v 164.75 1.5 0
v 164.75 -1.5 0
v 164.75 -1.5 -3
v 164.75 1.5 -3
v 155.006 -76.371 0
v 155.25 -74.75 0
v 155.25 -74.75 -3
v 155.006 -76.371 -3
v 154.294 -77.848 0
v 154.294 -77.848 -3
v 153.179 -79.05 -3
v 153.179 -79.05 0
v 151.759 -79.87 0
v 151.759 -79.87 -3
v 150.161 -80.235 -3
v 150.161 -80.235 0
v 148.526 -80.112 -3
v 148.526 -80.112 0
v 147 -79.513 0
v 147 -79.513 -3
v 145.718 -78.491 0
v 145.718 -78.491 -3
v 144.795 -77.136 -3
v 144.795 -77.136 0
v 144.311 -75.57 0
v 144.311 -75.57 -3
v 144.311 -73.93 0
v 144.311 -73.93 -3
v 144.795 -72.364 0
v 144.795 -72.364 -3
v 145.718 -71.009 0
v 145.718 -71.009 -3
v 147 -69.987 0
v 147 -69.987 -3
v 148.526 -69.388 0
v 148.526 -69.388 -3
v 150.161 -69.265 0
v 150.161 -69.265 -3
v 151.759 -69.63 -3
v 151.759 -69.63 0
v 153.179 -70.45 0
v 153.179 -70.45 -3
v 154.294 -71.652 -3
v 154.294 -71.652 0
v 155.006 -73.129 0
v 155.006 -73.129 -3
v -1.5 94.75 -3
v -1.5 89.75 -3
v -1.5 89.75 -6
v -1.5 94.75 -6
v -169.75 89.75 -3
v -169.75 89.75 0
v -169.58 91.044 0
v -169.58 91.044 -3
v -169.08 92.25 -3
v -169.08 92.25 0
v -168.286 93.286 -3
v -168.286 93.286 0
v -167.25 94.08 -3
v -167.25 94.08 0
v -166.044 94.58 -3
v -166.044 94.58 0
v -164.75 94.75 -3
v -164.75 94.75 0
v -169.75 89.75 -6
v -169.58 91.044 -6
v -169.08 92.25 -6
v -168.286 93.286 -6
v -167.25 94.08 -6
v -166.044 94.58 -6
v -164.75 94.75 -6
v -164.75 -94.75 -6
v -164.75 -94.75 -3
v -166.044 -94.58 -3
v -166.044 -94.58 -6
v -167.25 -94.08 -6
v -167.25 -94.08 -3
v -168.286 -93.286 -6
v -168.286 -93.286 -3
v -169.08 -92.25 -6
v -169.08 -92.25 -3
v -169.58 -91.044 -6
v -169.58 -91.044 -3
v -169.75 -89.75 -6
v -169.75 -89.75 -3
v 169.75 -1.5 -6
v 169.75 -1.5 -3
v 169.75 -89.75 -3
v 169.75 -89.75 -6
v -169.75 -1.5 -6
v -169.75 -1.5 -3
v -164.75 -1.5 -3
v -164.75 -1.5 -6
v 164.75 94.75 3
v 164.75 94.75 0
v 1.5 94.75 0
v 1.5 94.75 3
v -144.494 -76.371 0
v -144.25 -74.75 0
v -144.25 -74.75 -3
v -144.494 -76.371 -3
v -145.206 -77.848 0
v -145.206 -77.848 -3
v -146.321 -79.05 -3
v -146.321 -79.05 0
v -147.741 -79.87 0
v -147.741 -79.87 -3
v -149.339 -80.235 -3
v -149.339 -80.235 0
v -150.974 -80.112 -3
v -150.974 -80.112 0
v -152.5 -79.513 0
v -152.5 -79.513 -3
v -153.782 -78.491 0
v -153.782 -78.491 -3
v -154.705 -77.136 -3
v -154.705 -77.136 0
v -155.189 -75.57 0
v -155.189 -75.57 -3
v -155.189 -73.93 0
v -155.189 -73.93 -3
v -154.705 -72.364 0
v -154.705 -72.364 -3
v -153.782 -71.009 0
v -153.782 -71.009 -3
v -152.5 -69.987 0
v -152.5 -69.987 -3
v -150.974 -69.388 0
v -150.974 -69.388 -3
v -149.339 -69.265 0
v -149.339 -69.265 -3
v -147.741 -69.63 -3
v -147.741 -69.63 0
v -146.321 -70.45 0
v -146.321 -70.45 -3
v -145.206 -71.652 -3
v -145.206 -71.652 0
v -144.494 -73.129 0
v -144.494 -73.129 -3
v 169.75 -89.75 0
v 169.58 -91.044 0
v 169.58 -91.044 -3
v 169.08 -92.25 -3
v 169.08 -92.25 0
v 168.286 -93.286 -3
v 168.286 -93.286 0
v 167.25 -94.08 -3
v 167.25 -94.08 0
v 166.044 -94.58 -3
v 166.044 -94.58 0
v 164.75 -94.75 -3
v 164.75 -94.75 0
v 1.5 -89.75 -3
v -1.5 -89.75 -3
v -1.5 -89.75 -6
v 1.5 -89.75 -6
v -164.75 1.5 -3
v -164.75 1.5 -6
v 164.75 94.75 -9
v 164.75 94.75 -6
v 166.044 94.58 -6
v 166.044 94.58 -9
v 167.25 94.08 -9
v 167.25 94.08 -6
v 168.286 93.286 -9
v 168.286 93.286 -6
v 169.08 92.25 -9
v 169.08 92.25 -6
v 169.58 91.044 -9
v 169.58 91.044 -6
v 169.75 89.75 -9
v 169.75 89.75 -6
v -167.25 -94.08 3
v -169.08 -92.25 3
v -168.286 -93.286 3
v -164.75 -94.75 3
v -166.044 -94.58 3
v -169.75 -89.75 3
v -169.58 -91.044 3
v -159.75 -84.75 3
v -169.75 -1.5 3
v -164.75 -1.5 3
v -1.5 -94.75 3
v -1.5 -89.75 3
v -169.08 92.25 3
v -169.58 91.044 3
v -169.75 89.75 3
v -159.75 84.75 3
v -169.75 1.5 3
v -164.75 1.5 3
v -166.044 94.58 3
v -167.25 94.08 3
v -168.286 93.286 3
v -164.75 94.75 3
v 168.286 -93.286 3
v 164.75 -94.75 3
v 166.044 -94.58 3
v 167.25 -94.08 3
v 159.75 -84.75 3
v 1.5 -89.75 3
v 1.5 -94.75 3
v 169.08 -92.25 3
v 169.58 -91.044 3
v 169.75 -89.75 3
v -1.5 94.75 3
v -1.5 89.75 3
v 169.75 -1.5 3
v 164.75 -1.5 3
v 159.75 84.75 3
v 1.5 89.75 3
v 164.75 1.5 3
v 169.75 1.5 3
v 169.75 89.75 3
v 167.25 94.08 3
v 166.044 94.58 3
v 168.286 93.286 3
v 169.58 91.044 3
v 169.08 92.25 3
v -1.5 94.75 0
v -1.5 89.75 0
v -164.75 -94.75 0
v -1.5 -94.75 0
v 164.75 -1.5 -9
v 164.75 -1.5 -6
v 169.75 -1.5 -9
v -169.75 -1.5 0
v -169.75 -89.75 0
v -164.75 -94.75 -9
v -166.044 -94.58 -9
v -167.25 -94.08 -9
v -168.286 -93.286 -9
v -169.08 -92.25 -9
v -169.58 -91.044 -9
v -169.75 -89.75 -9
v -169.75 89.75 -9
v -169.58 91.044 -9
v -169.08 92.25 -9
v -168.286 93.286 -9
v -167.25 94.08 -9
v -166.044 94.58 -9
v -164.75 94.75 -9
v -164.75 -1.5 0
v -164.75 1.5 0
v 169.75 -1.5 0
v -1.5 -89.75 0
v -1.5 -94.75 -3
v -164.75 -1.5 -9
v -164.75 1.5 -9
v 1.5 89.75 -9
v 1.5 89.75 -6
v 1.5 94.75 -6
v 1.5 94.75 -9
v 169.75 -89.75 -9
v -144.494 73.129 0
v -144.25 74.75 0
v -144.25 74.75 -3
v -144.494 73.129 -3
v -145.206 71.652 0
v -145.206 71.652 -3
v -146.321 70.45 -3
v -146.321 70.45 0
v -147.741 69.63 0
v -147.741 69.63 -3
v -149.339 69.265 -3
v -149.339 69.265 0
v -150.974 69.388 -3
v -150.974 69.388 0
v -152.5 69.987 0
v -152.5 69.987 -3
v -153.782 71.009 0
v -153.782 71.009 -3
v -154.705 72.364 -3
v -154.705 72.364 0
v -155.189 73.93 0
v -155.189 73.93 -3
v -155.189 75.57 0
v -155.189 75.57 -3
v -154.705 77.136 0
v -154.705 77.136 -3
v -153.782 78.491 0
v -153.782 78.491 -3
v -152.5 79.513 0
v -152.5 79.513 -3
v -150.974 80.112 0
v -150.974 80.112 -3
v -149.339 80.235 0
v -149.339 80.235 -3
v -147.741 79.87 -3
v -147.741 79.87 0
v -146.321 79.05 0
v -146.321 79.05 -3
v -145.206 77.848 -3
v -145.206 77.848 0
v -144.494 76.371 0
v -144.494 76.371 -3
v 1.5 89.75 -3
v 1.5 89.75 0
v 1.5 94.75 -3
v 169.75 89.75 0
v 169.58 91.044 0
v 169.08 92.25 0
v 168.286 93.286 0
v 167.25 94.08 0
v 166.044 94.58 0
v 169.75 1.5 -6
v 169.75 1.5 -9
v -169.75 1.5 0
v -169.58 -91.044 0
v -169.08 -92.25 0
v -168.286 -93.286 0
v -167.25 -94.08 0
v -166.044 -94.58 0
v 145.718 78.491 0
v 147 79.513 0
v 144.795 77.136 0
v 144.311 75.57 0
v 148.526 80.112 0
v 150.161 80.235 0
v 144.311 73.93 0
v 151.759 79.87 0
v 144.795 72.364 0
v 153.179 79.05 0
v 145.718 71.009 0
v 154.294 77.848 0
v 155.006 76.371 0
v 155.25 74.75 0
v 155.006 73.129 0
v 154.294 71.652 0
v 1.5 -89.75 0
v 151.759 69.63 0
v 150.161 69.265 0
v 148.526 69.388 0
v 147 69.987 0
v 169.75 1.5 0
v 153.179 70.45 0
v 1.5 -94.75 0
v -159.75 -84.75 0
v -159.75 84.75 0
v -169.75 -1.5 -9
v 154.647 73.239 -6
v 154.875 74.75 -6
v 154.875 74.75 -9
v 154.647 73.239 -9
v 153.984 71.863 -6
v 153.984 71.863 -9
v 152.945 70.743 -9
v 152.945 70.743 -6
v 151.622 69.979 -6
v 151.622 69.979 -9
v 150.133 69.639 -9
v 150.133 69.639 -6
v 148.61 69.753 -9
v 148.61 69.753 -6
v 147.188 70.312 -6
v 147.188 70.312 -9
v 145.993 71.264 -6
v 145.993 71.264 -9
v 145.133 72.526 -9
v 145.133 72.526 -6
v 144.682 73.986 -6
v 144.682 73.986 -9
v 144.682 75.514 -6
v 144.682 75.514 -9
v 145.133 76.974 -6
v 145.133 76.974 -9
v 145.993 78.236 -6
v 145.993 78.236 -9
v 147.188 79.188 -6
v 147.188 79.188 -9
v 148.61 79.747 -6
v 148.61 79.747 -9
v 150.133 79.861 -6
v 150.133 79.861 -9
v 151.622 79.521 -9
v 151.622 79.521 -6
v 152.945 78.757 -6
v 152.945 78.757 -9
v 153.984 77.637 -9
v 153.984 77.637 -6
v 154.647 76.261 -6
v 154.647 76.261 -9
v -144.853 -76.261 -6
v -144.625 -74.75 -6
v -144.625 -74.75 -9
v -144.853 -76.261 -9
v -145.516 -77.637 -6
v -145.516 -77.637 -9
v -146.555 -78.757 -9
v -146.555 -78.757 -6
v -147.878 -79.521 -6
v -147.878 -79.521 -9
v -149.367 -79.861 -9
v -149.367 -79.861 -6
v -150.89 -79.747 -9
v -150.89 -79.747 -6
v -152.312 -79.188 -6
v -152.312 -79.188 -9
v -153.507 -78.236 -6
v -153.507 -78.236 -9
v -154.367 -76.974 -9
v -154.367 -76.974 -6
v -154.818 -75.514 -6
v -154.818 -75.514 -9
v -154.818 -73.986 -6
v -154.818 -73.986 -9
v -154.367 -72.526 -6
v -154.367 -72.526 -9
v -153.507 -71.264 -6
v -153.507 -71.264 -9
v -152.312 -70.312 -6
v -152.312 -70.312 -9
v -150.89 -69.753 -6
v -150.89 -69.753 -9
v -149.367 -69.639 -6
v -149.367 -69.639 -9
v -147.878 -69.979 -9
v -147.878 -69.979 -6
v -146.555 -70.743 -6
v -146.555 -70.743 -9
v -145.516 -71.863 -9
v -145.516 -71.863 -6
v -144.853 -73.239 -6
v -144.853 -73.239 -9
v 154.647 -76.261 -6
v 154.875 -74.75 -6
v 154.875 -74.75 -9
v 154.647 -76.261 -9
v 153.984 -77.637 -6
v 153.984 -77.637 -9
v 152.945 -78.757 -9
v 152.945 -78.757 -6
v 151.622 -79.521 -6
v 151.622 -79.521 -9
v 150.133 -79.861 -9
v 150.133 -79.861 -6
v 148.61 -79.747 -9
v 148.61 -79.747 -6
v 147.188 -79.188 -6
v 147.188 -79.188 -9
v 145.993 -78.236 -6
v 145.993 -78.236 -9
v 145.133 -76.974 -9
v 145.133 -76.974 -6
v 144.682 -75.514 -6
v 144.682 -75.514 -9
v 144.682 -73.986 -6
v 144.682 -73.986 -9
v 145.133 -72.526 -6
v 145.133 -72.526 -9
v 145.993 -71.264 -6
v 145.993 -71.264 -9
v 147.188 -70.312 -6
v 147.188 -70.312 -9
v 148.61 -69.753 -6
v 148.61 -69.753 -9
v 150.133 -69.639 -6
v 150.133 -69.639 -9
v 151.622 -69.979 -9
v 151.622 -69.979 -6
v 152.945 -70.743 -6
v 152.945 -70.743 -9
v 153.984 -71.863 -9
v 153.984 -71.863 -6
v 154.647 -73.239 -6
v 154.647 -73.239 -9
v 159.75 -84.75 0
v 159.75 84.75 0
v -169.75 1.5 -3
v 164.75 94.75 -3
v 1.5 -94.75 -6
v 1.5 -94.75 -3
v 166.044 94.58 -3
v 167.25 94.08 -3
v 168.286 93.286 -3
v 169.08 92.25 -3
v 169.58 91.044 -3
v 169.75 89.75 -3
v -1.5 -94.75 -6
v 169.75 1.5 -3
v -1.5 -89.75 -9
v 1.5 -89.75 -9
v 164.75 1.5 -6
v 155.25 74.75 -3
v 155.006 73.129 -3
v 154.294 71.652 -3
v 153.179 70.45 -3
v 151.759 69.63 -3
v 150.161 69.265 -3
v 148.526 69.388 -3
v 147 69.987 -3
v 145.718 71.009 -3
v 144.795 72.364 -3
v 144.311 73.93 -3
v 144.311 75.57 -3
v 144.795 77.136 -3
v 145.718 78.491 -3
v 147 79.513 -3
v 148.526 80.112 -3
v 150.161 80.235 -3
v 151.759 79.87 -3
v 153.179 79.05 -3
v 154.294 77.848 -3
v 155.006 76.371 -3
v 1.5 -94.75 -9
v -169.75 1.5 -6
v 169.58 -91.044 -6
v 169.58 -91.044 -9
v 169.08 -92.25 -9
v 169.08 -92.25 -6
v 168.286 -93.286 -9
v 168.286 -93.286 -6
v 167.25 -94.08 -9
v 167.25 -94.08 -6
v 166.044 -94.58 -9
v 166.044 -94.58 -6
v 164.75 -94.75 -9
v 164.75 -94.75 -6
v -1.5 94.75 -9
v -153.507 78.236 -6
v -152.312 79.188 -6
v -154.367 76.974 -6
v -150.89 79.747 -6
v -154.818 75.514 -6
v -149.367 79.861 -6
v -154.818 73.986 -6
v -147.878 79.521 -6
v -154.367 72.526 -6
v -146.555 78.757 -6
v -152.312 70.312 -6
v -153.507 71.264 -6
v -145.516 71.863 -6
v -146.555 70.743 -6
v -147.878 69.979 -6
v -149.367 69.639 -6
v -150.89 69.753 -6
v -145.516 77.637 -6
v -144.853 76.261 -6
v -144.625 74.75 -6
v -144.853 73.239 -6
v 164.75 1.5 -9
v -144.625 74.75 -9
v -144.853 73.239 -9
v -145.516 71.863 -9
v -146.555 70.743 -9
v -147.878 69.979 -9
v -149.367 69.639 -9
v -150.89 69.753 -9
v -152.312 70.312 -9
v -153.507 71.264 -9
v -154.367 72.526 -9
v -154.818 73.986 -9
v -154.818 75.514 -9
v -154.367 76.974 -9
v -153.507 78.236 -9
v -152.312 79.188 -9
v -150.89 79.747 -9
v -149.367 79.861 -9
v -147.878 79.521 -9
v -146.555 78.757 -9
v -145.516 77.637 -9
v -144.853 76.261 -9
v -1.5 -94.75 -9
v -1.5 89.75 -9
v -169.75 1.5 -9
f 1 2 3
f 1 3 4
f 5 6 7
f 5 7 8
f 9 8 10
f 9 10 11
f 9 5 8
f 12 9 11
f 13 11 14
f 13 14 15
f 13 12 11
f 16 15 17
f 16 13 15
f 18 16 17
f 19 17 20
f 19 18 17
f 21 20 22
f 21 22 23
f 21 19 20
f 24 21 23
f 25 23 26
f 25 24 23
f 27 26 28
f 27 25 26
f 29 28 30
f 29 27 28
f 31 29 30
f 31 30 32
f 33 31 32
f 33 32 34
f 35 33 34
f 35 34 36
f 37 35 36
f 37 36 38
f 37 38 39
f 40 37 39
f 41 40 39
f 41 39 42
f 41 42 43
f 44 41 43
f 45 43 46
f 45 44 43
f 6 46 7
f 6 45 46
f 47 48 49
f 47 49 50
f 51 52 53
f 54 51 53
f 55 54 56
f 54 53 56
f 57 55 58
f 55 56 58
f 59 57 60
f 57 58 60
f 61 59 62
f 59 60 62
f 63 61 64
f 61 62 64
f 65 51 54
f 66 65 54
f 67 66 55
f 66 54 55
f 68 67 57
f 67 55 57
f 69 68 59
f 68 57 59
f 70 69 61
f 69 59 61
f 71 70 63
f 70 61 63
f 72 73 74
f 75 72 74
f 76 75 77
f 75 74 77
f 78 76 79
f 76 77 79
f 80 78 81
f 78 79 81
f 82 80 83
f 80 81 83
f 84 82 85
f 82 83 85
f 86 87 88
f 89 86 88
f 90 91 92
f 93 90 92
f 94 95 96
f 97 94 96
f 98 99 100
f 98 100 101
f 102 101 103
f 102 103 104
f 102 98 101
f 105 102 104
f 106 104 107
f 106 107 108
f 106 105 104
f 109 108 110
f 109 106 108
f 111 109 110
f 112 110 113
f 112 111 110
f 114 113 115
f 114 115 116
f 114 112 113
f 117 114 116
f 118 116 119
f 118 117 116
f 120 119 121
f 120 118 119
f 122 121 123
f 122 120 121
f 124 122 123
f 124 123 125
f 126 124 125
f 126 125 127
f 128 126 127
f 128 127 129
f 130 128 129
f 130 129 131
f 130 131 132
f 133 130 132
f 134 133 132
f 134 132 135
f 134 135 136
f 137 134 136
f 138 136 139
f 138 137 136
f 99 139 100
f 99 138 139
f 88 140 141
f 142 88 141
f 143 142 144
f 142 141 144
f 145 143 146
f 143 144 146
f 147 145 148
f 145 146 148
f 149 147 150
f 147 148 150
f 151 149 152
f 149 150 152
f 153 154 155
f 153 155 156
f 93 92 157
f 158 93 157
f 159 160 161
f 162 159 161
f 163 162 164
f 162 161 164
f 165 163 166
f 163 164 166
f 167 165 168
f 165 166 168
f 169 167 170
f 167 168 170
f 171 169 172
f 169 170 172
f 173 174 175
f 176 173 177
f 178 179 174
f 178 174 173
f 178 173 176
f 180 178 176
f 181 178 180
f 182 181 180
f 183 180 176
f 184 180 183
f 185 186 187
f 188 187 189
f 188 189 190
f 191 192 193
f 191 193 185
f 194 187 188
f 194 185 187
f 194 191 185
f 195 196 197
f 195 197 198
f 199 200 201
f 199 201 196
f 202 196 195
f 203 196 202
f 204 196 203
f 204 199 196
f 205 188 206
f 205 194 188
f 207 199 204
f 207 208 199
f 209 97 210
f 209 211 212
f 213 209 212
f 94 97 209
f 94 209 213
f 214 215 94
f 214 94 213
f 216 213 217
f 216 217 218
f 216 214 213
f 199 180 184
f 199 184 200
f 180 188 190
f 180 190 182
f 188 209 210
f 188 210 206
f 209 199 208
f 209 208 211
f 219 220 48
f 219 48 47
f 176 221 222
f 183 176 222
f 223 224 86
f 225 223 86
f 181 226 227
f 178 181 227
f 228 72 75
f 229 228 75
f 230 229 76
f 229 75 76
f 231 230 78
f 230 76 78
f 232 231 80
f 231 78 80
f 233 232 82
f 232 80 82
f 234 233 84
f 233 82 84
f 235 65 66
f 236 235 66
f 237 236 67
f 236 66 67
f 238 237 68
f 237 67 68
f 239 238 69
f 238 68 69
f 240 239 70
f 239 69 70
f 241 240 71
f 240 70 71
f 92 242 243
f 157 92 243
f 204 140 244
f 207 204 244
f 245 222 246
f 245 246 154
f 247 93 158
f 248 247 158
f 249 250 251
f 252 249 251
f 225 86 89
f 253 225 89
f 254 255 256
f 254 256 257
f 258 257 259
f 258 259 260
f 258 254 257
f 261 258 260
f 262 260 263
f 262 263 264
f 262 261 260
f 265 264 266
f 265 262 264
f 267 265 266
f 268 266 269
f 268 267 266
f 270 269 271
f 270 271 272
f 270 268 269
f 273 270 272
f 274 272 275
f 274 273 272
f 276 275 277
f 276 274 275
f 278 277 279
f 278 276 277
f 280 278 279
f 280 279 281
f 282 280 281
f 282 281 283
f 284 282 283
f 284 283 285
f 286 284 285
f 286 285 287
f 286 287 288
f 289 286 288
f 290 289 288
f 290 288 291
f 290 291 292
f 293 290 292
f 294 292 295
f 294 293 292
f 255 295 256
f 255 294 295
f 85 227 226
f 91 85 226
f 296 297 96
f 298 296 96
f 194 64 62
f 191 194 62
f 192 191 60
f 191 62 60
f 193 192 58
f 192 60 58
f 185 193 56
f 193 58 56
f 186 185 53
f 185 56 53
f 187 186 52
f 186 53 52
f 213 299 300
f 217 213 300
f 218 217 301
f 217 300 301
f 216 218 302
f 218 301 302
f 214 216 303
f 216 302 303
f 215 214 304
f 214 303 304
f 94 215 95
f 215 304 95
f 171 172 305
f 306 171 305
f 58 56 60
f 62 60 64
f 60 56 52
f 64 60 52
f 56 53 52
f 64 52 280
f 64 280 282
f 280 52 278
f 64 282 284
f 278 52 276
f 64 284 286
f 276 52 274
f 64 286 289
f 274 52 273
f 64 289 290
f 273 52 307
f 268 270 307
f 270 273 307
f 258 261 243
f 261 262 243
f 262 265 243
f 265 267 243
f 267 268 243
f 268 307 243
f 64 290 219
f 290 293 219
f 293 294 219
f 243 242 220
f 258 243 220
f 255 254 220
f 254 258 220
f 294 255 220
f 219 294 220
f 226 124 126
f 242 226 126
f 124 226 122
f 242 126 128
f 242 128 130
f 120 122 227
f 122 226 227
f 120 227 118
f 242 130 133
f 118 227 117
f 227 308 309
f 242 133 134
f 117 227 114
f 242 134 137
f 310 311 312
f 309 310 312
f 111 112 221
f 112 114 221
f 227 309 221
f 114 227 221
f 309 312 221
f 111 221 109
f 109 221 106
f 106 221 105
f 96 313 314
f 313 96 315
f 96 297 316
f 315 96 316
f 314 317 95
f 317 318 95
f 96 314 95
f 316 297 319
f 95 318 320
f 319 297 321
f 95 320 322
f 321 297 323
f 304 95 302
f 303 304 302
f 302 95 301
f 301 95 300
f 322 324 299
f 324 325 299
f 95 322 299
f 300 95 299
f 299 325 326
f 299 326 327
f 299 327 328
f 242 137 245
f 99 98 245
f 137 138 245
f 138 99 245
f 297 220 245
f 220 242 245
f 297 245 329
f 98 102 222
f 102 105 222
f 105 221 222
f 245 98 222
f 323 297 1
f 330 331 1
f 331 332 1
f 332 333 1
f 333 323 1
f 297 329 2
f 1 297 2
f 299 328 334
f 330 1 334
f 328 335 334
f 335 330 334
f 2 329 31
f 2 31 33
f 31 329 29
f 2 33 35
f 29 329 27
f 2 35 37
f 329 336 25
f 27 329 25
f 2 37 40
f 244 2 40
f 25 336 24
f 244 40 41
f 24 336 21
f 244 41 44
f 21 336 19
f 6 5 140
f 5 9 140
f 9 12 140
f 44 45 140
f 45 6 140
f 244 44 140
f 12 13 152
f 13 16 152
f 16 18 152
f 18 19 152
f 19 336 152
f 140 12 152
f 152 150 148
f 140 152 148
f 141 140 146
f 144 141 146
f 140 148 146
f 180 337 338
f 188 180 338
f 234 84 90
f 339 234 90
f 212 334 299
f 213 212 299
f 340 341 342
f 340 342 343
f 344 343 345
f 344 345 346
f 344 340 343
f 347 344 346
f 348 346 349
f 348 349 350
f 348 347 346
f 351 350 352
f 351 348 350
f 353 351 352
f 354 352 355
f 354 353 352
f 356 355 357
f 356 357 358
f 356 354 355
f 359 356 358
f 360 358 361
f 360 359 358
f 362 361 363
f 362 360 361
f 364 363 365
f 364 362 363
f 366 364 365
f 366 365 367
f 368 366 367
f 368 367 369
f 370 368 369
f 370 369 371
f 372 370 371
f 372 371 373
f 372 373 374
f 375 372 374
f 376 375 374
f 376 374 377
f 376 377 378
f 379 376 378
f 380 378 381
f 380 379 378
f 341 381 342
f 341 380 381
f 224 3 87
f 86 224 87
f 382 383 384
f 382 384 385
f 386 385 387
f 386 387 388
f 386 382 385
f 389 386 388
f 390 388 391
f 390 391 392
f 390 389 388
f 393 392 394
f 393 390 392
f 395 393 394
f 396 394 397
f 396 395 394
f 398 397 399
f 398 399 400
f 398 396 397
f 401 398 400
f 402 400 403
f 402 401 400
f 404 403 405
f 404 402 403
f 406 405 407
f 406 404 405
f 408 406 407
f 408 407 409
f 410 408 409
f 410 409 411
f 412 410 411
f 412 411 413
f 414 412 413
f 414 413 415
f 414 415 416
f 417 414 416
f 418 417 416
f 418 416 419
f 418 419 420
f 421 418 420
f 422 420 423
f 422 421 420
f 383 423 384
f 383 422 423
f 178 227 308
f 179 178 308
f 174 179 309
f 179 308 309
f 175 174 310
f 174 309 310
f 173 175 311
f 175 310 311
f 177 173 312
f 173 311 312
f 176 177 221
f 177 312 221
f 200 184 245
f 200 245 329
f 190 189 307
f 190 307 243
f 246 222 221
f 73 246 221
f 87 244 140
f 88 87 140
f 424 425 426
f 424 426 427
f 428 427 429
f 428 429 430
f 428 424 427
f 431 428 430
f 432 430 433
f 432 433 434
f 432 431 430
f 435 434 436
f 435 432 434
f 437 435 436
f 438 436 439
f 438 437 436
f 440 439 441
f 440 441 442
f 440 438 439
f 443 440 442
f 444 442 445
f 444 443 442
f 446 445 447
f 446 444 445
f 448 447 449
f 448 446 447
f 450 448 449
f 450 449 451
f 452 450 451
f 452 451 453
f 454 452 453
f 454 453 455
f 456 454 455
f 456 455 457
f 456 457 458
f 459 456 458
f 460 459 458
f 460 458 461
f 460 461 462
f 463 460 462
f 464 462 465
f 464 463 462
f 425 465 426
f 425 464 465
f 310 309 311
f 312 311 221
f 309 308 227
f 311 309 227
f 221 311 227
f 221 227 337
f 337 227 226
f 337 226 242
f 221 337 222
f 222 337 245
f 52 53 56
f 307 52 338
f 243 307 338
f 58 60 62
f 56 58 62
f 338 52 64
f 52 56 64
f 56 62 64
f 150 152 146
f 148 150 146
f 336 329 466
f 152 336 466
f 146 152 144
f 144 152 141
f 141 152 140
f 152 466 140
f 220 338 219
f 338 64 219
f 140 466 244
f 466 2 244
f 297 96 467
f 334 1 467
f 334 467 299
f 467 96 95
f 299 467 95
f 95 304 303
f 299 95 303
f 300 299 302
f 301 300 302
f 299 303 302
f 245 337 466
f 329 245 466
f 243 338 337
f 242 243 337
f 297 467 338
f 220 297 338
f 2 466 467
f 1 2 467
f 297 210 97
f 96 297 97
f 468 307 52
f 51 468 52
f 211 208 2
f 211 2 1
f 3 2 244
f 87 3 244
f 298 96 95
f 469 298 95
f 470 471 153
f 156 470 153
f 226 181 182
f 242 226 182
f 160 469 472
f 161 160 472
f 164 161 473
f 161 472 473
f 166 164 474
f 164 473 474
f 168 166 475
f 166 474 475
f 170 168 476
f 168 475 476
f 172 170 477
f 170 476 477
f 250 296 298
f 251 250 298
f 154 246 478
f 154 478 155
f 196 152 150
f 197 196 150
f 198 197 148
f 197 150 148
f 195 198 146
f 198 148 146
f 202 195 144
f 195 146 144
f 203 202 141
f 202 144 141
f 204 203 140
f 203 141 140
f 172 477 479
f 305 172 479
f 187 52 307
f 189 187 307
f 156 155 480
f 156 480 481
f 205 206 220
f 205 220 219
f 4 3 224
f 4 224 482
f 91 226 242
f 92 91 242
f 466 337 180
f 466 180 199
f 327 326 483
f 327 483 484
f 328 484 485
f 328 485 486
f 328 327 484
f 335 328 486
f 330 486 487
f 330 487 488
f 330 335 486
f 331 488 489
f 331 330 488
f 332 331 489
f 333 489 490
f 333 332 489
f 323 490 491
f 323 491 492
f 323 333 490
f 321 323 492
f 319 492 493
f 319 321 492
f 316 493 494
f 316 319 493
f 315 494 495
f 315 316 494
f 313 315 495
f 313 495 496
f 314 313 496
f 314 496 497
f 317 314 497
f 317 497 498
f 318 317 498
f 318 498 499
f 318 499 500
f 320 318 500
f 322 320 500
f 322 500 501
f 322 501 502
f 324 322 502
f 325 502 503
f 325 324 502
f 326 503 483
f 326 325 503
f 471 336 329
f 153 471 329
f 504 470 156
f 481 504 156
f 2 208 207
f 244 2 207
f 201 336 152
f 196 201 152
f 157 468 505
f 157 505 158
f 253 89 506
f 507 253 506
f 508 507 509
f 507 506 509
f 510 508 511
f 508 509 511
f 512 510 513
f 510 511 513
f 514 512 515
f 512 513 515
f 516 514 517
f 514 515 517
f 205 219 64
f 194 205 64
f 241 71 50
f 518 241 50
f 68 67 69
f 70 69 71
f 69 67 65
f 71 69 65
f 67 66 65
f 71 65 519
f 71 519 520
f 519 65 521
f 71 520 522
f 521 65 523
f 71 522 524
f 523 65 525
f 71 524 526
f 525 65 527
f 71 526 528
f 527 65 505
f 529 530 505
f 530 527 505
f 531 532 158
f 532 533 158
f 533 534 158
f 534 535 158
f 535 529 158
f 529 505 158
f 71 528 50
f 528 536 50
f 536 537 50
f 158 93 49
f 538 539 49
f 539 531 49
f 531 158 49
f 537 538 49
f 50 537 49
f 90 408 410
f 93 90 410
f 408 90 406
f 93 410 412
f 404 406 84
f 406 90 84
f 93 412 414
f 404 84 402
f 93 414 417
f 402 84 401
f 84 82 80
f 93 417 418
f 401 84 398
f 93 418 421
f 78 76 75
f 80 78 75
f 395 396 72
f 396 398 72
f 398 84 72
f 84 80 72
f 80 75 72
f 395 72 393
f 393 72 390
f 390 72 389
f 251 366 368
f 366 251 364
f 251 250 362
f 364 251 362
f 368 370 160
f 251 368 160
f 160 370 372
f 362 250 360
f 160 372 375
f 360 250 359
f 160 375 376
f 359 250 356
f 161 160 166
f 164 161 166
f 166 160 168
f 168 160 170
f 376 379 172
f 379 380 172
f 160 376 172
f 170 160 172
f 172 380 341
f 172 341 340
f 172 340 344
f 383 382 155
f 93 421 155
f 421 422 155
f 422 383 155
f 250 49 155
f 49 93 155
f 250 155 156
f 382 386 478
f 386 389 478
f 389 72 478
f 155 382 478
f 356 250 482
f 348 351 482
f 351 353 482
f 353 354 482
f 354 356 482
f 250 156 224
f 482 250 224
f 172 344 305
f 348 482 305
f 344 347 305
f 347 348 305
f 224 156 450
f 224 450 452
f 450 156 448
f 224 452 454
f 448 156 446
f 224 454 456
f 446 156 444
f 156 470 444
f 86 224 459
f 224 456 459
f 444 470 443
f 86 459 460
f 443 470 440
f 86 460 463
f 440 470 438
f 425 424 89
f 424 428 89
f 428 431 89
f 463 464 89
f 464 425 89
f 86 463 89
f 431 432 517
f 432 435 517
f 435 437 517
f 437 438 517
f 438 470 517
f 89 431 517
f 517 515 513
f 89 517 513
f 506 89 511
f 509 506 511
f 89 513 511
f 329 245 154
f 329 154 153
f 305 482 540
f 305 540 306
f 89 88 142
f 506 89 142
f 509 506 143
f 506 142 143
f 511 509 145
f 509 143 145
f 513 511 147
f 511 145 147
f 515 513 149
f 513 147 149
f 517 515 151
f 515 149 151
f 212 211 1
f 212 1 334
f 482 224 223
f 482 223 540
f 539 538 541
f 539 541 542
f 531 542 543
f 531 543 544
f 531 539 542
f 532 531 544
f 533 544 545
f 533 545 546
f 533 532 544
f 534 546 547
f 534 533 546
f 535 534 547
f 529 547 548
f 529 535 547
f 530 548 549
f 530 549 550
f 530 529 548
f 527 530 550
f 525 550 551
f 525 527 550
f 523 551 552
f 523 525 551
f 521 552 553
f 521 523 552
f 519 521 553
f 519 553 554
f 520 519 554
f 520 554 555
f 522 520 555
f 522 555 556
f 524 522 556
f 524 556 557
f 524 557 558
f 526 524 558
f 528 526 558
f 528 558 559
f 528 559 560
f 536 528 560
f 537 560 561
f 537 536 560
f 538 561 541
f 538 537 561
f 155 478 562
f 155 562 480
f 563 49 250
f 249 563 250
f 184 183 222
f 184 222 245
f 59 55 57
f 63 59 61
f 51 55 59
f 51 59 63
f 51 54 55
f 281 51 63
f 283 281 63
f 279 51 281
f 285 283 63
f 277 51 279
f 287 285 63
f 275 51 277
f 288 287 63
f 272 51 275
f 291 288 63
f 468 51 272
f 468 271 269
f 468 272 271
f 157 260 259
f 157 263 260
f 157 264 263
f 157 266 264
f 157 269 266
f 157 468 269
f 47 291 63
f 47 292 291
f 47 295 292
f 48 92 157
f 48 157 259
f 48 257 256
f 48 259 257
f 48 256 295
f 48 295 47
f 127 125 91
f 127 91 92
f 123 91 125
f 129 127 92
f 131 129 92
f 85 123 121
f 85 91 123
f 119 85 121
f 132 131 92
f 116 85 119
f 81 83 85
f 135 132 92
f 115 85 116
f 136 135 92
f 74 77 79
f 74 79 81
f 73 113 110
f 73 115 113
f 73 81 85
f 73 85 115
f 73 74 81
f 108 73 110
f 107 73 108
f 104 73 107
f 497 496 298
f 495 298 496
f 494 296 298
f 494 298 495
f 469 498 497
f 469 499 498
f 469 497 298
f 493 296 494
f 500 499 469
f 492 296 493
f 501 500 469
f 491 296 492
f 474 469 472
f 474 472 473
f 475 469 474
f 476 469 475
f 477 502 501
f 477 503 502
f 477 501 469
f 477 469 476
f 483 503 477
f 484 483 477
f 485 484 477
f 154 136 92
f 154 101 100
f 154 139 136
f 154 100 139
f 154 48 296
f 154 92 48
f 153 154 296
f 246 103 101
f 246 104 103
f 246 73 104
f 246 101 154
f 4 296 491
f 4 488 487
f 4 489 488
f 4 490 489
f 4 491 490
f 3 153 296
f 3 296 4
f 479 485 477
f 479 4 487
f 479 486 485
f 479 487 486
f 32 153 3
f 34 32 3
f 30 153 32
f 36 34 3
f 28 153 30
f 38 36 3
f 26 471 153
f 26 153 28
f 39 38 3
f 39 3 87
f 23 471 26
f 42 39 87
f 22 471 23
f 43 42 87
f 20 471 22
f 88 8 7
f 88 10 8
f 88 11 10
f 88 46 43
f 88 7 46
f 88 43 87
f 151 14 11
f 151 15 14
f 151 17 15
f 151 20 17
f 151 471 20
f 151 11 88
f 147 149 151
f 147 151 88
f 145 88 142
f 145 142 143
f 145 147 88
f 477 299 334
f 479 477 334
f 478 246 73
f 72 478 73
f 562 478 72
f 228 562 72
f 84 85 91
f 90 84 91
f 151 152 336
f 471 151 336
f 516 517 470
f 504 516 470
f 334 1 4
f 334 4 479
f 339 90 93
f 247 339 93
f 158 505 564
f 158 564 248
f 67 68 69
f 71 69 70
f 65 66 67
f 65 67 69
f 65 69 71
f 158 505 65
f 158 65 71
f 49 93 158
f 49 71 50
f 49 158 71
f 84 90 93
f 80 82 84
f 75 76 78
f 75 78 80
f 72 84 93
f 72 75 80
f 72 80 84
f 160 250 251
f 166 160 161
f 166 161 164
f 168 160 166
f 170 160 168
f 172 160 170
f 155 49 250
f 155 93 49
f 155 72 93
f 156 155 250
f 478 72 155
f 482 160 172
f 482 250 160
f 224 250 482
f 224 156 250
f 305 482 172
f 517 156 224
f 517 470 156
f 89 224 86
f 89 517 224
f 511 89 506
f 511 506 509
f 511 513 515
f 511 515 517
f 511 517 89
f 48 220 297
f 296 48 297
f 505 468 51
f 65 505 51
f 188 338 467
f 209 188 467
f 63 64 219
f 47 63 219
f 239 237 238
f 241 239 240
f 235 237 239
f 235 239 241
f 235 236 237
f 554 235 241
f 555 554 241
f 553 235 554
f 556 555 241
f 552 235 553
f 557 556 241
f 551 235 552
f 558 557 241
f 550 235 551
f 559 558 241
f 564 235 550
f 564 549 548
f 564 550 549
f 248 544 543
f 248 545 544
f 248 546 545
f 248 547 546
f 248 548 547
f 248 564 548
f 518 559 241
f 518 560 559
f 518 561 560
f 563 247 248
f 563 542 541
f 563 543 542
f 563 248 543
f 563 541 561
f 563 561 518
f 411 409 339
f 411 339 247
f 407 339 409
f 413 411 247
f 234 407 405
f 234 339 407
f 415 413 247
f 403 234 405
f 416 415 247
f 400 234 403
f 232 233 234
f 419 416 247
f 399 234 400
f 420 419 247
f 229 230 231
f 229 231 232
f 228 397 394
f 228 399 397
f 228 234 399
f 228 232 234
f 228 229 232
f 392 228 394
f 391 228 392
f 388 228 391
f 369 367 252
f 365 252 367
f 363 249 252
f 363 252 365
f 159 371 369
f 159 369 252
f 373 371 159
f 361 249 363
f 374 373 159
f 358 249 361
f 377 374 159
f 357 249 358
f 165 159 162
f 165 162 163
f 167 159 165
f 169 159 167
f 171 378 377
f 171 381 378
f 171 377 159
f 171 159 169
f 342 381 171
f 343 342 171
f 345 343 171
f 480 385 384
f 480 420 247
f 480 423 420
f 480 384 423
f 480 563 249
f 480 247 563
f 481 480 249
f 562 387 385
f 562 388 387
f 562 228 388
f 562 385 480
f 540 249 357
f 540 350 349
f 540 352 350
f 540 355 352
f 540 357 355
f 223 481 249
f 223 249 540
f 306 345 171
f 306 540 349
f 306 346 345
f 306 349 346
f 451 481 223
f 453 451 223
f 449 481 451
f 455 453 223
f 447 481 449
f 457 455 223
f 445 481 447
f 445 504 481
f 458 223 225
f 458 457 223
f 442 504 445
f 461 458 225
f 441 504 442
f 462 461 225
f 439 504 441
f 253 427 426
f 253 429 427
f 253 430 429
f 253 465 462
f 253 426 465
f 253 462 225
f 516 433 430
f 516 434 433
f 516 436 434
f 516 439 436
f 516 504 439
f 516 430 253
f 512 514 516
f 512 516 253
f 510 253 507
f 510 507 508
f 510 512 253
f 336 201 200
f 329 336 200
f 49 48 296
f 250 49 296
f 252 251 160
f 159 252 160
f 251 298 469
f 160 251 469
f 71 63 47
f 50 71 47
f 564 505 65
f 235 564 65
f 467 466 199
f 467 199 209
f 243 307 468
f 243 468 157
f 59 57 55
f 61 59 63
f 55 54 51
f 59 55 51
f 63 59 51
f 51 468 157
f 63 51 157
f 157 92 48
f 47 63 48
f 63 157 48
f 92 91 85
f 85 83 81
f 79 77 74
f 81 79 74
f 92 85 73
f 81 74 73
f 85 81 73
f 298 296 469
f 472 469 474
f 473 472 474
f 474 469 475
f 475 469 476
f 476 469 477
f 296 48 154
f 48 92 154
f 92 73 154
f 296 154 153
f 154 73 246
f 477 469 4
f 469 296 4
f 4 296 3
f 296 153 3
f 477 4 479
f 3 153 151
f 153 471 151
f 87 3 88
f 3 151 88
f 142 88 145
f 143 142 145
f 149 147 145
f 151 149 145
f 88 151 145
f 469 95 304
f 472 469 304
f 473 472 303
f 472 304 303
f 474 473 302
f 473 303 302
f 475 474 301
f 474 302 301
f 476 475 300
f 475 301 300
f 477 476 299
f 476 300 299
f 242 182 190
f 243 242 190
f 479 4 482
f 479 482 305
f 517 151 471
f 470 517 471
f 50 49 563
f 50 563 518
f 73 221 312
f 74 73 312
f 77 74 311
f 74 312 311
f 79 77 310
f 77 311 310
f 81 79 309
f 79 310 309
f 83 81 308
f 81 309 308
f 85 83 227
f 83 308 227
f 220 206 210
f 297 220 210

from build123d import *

# Parameters (mm, degrees)
F1_W      = 319.5
F1_H      = 169.5
F2_DEPTH  = 3
F3_R      = 5.5
F4_DEPTH  = 3
F6_DEPTH  = 3
F7_R      = 5.125
F8_DEPTH  = 3
F9_W      = 3
F9_H      = 5
F9_W_2    = 5
F9_H_2    = 3
F10_DEPTH = 12.001


with BuildPart() as f2:
    # F1 (on face) → F2 (new body)
    with BuildSketch(Plane.XY):
        with BuildLine():
            ThreePointArc((169.75, 89.75), (168.285534, 93.285534), (164.75, 94.75))
            Line((164.75, 94.75), (-164.75, 94.75))
            ThreePointArc((-164.75, 94.75), (-168.285534, 93.285534), (-169.75, 89.75))
            Line((-169.75, 89.75), (-169.75, -89.75))
            ThreePointArc((-169.75, -89.75), (-168.285534, -93.285534), (-164.75, -94.75))
            Line((-164.75, -94.75), (164.75, -94.75))
            ThreePointArc((164.75, -94.75), (168.285534, -93.285534), (169.75, -89.75))
            Line((169.75, -89.75), (169.75, 89.75))
        make_face()
        Rectangle(F1_W, F1_H, mode=Mode.SUBTRACT)
    extrude(amount=F2_DEPTH)


with BuildPart() as f4:
    # F3 (on face) → F4 (new body)
    with BuildSketch(Plane(origin=(0, 0, 0), x_dir=(1, 0, 0), z_dir=(0, 0, -1))):
        with BuildLine():
            ThreePointArc((169.75, 89.75), (168.285534, 93.285534), (164.75, 94.75))
            Line((164.75, 94.75), (-164.75, 94.75))
            ThreePointArc((-164.75, 94.75), (-168.285534, 93.285534), (-169.75, 89.75))
            Line((-169.75, 89.75), (-169.75, -89.75))
            ThreePointArc((-169.75, -89.75), (-168.285534, -93.285534), (-164.75, -94.75))
            Line((-164.75, -94.75), (164.75, -94.75))
            ThreePointArc((164.75, -94.75), (168.285534, -93.285534), (169.75, -89.75))
            Line((169.75, -89.75), (169.75, 89.75))
        make_face()
        with Locations((-149.75, -74.75)):
            Circle(F3_R, mode=Mode.SUBTRACT)
        with Locations((149.75, -74.75)):
            Circle(F3_R, mode=Mode.SUBTRACT)
        with Locations((-149.75, 74.75)):
            Circle(F3_R, mode=Mode.SUBTRACT)
        with Locations((149.75, 74.75)):
            Circle(F3_R, mode=Mode.SUBTRACT)
    extrude(amount=F4_DEPTH)


with BuildPart() as f6:
    # F5 (on face) → F6 (new body)
    with BuildSketch(Plane(origin=(0, 0, -3), x_dir=(1, 0, 0), z_dir=(0, 0, -1))):
        with BuildLine():
            Line((169.75, -89.75), (169.75, 89.75))
            ThreePointArc((169.75, 89.75), (168.285534, 93.285534), (164.75, 94.75))
            Line((164.75, 94.75), (-164.75, 94.75))
            ThreePointArc((-164.75, 94.75), (-168.285534, 93.285534), (-169.75, 89.75))
            Line((-169.75, 89.75), (-169.75, -89.75))
            ThreePointArc((-169.75, -89.75), (-168.285534, -93.285534), (-164.75, -94.75))
            Line((-164.75, -94.75), (164.75, -94.75))
            ThreePointArc((164.75, -94.75), (168.285534, -93.285534), (169.75, -89.75))
        make_face()
    extrude(amount=F6_DEPTH)


with BuildPart() as f8:
    # F7 (on face) → F8 (new body)
    with BuildSketch(Plane(origin=(0, 0, -6), x_dir=(1, 0, 0), z_dir=(0, 0, -1))):
        with BuildLine():
            Line((169.75, -89.75), (169.75, 89.75))
            ThreePointArc((169.75, 89.75), (168.285534, 93.285534), (164.75, 94.75))
            Line((164.75, 94.75), (-164.75, 94.75))
            ThreePointArc((-164.75, 94.75), (-168.285534, 93.285534), (-169.75, 89.75))
            Line((-169.75, 89.75), (-169.75, -89.75))
            ThreePointArc((-169.75, -89.75), (-168.285534, -93.285534), (-164.75, -94.75))
            Line((-164.75, -94.75), (164.75, -94.75))
            ThreePointArc((164.75, -94.75), (168.285534, -93.285534), (169.75, -89.75))
        make_face()
        with Locations((-149.75, -74.75)):
            Circle(F7_R, mode=Mode.SUBTRACT)
        with Locations((149.75, -74.75)):
            Circle(F7_R, mode=Mode.SUBTRACT)
        with Locations((-149.75, 74.75)):
            Circle(F7_R, mode=Mode.SUBTRACT)
        with Locations((149.75, 74.75)):
            Circle(F7_R, mode=Mode.SUBTRACT)
    extrude(amount=F8_DEPTH)


with BuildPart() as f10_tool:
    # F9 (on face) → F10 (new body, through all)
    with BuildSketch(Plane.XY.offset(3)):
        with Locations((0, 92.25)):
            Rectangle(F9_W, F9_H)
        with Locations((0, -92.25)):
            Rectangle(F9_W, F9_H)
        with Locations((167.25, 0)):
            Rectangle(F9_W_2, F9_H_2)
        with Locations((-167.25, 0)):
            Rectangle(F9_W_2, F9_H_2)
    extrude(amount=-F10_DEPTH)


with BuildPart() as f2_1:
    add(f2.part)

    # F10: cut by f10_tool
    add(f10_tool.part, mode=Mode.SUBTRACT)


with BuildPart() as f4_1:
    add(f4.part)

    # F10: cut by f10_tool
    add(f10_tool.part, mode=Mode.SUBTRACT)


with BuildPart() as f6_1:
    add(f6.part)

    # F10: cut by f10_tool
    add(f10_tool.part, mode=Mode.SUBTRACT)


with BuildPart() as f8_1:
    add(f8.part)

    # F10: cut by f10_tool
    add(f10_tool.part, mode=Mode.SUBTRACT)


solid = Compound([f2_1.part, f4_1.part, f6_1.part, f8_1.part])
